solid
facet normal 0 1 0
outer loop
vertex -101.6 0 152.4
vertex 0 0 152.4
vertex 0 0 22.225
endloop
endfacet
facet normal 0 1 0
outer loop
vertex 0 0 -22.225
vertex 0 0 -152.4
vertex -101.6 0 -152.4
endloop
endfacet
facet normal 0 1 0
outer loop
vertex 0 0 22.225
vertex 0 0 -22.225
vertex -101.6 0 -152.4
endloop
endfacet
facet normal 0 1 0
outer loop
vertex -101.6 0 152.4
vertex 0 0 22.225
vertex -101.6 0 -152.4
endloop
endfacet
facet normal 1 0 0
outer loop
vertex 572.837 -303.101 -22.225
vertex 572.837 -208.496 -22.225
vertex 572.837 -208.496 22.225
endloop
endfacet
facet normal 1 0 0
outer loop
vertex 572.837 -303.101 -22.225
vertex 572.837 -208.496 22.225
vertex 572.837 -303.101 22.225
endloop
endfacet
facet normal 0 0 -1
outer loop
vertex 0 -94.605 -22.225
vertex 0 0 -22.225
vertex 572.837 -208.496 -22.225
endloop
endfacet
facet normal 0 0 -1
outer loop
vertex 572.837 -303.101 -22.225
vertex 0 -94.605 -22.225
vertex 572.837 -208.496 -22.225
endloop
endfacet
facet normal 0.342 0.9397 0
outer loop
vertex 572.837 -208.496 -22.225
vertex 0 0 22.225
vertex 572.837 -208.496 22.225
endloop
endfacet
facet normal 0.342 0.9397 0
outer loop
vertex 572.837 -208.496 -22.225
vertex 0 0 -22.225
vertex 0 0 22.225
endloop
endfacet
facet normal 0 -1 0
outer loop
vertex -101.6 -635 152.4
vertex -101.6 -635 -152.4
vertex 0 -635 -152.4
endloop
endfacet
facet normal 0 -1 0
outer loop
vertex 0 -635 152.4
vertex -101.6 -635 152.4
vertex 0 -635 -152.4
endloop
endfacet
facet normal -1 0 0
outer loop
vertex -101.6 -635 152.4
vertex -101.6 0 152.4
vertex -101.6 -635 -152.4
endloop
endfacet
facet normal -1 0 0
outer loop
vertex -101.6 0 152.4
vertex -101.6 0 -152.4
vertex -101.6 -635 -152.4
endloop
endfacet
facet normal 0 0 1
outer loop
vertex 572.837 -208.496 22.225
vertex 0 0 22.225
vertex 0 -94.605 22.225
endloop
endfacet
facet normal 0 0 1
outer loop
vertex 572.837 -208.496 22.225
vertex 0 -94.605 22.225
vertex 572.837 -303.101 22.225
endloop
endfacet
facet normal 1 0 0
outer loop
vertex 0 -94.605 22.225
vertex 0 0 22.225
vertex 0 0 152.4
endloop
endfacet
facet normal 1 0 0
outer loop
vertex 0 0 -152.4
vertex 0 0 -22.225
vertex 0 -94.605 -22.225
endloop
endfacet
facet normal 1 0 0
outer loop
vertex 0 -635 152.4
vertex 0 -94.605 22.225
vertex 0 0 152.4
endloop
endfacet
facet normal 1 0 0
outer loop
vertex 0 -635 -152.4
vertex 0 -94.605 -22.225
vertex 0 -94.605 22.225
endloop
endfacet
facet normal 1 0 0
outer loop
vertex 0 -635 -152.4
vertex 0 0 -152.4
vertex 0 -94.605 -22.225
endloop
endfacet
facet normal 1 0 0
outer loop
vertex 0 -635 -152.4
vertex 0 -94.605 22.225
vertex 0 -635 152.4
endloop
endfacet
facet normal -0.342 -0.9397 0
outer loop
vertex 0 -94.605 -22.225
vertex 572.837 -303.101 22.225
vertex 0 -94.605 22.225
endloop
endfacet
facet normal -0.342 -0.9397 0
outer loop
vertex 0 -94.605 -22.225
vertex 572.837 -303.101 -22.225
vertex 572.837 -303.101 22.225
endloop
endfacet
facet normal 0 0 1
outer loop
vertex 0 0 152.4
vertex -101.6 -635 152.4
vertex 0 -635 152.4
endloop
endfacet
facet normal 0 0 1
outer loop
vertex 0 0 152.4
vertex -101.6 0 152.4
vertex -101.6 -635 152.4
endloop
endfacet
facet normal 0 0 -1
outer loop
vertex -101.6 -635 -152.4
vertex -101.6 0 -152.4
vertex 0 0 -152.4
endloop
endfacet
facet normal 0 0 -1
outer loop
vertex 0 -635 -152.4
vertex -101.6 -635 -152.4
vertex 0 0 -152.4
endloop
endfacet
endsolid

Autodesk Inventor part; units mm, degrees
ref_plane "YZ Plane" through (0, 0, 0) normal (1, 0, 0) x (0, 1, 0)
ref_plane "XZ Plane" through (0, 0, 0) normal (0, 1, 0) x (-1, 0, 0)
ref_plane "XY Plane" through (0, 0, 0) normal (0, 0, 1) x (1, 0, 0)
sketch "Sketch1" plane through (0, 0, 0) normal (0, 0, 1) x (1, 0, 0)
  line L0 (0, 0) -> (0, -635)
  line L1 (0, 0) -> (572.8366, -208.4955)
  line L2 (0, 0) -> (609.6, 0) construction
  line L3 (572.8366, -208.4955) -> (572.8366, -303.1009)
  line L4 (572.8366, -303.1009) -> (0, -94.6054)
  line L5 (0, 0) -> (-101.6, 0)
  line L6 (-101.6, 0) -> (-101.6, -635)
  line L7 (-101.6, -635) -> (0, -635)
  dimension "d0" = 635
  dimension "d1" = 609.6
  dimension "d2" = 20
  dimension "d3" = 88.9
  dimension "d4" = 101.6
extrude "Extrusion1" add sketch "Sketch1" along normal mid plane 304.8 contours L0 L7 L6 L5
extrude "Extrusion2" add sketch "Sketch1" along normal mid plane 44.45 contours L1 L3 L4 L0
properties part number "GarageSegment" material "Wood (Walnut)"
